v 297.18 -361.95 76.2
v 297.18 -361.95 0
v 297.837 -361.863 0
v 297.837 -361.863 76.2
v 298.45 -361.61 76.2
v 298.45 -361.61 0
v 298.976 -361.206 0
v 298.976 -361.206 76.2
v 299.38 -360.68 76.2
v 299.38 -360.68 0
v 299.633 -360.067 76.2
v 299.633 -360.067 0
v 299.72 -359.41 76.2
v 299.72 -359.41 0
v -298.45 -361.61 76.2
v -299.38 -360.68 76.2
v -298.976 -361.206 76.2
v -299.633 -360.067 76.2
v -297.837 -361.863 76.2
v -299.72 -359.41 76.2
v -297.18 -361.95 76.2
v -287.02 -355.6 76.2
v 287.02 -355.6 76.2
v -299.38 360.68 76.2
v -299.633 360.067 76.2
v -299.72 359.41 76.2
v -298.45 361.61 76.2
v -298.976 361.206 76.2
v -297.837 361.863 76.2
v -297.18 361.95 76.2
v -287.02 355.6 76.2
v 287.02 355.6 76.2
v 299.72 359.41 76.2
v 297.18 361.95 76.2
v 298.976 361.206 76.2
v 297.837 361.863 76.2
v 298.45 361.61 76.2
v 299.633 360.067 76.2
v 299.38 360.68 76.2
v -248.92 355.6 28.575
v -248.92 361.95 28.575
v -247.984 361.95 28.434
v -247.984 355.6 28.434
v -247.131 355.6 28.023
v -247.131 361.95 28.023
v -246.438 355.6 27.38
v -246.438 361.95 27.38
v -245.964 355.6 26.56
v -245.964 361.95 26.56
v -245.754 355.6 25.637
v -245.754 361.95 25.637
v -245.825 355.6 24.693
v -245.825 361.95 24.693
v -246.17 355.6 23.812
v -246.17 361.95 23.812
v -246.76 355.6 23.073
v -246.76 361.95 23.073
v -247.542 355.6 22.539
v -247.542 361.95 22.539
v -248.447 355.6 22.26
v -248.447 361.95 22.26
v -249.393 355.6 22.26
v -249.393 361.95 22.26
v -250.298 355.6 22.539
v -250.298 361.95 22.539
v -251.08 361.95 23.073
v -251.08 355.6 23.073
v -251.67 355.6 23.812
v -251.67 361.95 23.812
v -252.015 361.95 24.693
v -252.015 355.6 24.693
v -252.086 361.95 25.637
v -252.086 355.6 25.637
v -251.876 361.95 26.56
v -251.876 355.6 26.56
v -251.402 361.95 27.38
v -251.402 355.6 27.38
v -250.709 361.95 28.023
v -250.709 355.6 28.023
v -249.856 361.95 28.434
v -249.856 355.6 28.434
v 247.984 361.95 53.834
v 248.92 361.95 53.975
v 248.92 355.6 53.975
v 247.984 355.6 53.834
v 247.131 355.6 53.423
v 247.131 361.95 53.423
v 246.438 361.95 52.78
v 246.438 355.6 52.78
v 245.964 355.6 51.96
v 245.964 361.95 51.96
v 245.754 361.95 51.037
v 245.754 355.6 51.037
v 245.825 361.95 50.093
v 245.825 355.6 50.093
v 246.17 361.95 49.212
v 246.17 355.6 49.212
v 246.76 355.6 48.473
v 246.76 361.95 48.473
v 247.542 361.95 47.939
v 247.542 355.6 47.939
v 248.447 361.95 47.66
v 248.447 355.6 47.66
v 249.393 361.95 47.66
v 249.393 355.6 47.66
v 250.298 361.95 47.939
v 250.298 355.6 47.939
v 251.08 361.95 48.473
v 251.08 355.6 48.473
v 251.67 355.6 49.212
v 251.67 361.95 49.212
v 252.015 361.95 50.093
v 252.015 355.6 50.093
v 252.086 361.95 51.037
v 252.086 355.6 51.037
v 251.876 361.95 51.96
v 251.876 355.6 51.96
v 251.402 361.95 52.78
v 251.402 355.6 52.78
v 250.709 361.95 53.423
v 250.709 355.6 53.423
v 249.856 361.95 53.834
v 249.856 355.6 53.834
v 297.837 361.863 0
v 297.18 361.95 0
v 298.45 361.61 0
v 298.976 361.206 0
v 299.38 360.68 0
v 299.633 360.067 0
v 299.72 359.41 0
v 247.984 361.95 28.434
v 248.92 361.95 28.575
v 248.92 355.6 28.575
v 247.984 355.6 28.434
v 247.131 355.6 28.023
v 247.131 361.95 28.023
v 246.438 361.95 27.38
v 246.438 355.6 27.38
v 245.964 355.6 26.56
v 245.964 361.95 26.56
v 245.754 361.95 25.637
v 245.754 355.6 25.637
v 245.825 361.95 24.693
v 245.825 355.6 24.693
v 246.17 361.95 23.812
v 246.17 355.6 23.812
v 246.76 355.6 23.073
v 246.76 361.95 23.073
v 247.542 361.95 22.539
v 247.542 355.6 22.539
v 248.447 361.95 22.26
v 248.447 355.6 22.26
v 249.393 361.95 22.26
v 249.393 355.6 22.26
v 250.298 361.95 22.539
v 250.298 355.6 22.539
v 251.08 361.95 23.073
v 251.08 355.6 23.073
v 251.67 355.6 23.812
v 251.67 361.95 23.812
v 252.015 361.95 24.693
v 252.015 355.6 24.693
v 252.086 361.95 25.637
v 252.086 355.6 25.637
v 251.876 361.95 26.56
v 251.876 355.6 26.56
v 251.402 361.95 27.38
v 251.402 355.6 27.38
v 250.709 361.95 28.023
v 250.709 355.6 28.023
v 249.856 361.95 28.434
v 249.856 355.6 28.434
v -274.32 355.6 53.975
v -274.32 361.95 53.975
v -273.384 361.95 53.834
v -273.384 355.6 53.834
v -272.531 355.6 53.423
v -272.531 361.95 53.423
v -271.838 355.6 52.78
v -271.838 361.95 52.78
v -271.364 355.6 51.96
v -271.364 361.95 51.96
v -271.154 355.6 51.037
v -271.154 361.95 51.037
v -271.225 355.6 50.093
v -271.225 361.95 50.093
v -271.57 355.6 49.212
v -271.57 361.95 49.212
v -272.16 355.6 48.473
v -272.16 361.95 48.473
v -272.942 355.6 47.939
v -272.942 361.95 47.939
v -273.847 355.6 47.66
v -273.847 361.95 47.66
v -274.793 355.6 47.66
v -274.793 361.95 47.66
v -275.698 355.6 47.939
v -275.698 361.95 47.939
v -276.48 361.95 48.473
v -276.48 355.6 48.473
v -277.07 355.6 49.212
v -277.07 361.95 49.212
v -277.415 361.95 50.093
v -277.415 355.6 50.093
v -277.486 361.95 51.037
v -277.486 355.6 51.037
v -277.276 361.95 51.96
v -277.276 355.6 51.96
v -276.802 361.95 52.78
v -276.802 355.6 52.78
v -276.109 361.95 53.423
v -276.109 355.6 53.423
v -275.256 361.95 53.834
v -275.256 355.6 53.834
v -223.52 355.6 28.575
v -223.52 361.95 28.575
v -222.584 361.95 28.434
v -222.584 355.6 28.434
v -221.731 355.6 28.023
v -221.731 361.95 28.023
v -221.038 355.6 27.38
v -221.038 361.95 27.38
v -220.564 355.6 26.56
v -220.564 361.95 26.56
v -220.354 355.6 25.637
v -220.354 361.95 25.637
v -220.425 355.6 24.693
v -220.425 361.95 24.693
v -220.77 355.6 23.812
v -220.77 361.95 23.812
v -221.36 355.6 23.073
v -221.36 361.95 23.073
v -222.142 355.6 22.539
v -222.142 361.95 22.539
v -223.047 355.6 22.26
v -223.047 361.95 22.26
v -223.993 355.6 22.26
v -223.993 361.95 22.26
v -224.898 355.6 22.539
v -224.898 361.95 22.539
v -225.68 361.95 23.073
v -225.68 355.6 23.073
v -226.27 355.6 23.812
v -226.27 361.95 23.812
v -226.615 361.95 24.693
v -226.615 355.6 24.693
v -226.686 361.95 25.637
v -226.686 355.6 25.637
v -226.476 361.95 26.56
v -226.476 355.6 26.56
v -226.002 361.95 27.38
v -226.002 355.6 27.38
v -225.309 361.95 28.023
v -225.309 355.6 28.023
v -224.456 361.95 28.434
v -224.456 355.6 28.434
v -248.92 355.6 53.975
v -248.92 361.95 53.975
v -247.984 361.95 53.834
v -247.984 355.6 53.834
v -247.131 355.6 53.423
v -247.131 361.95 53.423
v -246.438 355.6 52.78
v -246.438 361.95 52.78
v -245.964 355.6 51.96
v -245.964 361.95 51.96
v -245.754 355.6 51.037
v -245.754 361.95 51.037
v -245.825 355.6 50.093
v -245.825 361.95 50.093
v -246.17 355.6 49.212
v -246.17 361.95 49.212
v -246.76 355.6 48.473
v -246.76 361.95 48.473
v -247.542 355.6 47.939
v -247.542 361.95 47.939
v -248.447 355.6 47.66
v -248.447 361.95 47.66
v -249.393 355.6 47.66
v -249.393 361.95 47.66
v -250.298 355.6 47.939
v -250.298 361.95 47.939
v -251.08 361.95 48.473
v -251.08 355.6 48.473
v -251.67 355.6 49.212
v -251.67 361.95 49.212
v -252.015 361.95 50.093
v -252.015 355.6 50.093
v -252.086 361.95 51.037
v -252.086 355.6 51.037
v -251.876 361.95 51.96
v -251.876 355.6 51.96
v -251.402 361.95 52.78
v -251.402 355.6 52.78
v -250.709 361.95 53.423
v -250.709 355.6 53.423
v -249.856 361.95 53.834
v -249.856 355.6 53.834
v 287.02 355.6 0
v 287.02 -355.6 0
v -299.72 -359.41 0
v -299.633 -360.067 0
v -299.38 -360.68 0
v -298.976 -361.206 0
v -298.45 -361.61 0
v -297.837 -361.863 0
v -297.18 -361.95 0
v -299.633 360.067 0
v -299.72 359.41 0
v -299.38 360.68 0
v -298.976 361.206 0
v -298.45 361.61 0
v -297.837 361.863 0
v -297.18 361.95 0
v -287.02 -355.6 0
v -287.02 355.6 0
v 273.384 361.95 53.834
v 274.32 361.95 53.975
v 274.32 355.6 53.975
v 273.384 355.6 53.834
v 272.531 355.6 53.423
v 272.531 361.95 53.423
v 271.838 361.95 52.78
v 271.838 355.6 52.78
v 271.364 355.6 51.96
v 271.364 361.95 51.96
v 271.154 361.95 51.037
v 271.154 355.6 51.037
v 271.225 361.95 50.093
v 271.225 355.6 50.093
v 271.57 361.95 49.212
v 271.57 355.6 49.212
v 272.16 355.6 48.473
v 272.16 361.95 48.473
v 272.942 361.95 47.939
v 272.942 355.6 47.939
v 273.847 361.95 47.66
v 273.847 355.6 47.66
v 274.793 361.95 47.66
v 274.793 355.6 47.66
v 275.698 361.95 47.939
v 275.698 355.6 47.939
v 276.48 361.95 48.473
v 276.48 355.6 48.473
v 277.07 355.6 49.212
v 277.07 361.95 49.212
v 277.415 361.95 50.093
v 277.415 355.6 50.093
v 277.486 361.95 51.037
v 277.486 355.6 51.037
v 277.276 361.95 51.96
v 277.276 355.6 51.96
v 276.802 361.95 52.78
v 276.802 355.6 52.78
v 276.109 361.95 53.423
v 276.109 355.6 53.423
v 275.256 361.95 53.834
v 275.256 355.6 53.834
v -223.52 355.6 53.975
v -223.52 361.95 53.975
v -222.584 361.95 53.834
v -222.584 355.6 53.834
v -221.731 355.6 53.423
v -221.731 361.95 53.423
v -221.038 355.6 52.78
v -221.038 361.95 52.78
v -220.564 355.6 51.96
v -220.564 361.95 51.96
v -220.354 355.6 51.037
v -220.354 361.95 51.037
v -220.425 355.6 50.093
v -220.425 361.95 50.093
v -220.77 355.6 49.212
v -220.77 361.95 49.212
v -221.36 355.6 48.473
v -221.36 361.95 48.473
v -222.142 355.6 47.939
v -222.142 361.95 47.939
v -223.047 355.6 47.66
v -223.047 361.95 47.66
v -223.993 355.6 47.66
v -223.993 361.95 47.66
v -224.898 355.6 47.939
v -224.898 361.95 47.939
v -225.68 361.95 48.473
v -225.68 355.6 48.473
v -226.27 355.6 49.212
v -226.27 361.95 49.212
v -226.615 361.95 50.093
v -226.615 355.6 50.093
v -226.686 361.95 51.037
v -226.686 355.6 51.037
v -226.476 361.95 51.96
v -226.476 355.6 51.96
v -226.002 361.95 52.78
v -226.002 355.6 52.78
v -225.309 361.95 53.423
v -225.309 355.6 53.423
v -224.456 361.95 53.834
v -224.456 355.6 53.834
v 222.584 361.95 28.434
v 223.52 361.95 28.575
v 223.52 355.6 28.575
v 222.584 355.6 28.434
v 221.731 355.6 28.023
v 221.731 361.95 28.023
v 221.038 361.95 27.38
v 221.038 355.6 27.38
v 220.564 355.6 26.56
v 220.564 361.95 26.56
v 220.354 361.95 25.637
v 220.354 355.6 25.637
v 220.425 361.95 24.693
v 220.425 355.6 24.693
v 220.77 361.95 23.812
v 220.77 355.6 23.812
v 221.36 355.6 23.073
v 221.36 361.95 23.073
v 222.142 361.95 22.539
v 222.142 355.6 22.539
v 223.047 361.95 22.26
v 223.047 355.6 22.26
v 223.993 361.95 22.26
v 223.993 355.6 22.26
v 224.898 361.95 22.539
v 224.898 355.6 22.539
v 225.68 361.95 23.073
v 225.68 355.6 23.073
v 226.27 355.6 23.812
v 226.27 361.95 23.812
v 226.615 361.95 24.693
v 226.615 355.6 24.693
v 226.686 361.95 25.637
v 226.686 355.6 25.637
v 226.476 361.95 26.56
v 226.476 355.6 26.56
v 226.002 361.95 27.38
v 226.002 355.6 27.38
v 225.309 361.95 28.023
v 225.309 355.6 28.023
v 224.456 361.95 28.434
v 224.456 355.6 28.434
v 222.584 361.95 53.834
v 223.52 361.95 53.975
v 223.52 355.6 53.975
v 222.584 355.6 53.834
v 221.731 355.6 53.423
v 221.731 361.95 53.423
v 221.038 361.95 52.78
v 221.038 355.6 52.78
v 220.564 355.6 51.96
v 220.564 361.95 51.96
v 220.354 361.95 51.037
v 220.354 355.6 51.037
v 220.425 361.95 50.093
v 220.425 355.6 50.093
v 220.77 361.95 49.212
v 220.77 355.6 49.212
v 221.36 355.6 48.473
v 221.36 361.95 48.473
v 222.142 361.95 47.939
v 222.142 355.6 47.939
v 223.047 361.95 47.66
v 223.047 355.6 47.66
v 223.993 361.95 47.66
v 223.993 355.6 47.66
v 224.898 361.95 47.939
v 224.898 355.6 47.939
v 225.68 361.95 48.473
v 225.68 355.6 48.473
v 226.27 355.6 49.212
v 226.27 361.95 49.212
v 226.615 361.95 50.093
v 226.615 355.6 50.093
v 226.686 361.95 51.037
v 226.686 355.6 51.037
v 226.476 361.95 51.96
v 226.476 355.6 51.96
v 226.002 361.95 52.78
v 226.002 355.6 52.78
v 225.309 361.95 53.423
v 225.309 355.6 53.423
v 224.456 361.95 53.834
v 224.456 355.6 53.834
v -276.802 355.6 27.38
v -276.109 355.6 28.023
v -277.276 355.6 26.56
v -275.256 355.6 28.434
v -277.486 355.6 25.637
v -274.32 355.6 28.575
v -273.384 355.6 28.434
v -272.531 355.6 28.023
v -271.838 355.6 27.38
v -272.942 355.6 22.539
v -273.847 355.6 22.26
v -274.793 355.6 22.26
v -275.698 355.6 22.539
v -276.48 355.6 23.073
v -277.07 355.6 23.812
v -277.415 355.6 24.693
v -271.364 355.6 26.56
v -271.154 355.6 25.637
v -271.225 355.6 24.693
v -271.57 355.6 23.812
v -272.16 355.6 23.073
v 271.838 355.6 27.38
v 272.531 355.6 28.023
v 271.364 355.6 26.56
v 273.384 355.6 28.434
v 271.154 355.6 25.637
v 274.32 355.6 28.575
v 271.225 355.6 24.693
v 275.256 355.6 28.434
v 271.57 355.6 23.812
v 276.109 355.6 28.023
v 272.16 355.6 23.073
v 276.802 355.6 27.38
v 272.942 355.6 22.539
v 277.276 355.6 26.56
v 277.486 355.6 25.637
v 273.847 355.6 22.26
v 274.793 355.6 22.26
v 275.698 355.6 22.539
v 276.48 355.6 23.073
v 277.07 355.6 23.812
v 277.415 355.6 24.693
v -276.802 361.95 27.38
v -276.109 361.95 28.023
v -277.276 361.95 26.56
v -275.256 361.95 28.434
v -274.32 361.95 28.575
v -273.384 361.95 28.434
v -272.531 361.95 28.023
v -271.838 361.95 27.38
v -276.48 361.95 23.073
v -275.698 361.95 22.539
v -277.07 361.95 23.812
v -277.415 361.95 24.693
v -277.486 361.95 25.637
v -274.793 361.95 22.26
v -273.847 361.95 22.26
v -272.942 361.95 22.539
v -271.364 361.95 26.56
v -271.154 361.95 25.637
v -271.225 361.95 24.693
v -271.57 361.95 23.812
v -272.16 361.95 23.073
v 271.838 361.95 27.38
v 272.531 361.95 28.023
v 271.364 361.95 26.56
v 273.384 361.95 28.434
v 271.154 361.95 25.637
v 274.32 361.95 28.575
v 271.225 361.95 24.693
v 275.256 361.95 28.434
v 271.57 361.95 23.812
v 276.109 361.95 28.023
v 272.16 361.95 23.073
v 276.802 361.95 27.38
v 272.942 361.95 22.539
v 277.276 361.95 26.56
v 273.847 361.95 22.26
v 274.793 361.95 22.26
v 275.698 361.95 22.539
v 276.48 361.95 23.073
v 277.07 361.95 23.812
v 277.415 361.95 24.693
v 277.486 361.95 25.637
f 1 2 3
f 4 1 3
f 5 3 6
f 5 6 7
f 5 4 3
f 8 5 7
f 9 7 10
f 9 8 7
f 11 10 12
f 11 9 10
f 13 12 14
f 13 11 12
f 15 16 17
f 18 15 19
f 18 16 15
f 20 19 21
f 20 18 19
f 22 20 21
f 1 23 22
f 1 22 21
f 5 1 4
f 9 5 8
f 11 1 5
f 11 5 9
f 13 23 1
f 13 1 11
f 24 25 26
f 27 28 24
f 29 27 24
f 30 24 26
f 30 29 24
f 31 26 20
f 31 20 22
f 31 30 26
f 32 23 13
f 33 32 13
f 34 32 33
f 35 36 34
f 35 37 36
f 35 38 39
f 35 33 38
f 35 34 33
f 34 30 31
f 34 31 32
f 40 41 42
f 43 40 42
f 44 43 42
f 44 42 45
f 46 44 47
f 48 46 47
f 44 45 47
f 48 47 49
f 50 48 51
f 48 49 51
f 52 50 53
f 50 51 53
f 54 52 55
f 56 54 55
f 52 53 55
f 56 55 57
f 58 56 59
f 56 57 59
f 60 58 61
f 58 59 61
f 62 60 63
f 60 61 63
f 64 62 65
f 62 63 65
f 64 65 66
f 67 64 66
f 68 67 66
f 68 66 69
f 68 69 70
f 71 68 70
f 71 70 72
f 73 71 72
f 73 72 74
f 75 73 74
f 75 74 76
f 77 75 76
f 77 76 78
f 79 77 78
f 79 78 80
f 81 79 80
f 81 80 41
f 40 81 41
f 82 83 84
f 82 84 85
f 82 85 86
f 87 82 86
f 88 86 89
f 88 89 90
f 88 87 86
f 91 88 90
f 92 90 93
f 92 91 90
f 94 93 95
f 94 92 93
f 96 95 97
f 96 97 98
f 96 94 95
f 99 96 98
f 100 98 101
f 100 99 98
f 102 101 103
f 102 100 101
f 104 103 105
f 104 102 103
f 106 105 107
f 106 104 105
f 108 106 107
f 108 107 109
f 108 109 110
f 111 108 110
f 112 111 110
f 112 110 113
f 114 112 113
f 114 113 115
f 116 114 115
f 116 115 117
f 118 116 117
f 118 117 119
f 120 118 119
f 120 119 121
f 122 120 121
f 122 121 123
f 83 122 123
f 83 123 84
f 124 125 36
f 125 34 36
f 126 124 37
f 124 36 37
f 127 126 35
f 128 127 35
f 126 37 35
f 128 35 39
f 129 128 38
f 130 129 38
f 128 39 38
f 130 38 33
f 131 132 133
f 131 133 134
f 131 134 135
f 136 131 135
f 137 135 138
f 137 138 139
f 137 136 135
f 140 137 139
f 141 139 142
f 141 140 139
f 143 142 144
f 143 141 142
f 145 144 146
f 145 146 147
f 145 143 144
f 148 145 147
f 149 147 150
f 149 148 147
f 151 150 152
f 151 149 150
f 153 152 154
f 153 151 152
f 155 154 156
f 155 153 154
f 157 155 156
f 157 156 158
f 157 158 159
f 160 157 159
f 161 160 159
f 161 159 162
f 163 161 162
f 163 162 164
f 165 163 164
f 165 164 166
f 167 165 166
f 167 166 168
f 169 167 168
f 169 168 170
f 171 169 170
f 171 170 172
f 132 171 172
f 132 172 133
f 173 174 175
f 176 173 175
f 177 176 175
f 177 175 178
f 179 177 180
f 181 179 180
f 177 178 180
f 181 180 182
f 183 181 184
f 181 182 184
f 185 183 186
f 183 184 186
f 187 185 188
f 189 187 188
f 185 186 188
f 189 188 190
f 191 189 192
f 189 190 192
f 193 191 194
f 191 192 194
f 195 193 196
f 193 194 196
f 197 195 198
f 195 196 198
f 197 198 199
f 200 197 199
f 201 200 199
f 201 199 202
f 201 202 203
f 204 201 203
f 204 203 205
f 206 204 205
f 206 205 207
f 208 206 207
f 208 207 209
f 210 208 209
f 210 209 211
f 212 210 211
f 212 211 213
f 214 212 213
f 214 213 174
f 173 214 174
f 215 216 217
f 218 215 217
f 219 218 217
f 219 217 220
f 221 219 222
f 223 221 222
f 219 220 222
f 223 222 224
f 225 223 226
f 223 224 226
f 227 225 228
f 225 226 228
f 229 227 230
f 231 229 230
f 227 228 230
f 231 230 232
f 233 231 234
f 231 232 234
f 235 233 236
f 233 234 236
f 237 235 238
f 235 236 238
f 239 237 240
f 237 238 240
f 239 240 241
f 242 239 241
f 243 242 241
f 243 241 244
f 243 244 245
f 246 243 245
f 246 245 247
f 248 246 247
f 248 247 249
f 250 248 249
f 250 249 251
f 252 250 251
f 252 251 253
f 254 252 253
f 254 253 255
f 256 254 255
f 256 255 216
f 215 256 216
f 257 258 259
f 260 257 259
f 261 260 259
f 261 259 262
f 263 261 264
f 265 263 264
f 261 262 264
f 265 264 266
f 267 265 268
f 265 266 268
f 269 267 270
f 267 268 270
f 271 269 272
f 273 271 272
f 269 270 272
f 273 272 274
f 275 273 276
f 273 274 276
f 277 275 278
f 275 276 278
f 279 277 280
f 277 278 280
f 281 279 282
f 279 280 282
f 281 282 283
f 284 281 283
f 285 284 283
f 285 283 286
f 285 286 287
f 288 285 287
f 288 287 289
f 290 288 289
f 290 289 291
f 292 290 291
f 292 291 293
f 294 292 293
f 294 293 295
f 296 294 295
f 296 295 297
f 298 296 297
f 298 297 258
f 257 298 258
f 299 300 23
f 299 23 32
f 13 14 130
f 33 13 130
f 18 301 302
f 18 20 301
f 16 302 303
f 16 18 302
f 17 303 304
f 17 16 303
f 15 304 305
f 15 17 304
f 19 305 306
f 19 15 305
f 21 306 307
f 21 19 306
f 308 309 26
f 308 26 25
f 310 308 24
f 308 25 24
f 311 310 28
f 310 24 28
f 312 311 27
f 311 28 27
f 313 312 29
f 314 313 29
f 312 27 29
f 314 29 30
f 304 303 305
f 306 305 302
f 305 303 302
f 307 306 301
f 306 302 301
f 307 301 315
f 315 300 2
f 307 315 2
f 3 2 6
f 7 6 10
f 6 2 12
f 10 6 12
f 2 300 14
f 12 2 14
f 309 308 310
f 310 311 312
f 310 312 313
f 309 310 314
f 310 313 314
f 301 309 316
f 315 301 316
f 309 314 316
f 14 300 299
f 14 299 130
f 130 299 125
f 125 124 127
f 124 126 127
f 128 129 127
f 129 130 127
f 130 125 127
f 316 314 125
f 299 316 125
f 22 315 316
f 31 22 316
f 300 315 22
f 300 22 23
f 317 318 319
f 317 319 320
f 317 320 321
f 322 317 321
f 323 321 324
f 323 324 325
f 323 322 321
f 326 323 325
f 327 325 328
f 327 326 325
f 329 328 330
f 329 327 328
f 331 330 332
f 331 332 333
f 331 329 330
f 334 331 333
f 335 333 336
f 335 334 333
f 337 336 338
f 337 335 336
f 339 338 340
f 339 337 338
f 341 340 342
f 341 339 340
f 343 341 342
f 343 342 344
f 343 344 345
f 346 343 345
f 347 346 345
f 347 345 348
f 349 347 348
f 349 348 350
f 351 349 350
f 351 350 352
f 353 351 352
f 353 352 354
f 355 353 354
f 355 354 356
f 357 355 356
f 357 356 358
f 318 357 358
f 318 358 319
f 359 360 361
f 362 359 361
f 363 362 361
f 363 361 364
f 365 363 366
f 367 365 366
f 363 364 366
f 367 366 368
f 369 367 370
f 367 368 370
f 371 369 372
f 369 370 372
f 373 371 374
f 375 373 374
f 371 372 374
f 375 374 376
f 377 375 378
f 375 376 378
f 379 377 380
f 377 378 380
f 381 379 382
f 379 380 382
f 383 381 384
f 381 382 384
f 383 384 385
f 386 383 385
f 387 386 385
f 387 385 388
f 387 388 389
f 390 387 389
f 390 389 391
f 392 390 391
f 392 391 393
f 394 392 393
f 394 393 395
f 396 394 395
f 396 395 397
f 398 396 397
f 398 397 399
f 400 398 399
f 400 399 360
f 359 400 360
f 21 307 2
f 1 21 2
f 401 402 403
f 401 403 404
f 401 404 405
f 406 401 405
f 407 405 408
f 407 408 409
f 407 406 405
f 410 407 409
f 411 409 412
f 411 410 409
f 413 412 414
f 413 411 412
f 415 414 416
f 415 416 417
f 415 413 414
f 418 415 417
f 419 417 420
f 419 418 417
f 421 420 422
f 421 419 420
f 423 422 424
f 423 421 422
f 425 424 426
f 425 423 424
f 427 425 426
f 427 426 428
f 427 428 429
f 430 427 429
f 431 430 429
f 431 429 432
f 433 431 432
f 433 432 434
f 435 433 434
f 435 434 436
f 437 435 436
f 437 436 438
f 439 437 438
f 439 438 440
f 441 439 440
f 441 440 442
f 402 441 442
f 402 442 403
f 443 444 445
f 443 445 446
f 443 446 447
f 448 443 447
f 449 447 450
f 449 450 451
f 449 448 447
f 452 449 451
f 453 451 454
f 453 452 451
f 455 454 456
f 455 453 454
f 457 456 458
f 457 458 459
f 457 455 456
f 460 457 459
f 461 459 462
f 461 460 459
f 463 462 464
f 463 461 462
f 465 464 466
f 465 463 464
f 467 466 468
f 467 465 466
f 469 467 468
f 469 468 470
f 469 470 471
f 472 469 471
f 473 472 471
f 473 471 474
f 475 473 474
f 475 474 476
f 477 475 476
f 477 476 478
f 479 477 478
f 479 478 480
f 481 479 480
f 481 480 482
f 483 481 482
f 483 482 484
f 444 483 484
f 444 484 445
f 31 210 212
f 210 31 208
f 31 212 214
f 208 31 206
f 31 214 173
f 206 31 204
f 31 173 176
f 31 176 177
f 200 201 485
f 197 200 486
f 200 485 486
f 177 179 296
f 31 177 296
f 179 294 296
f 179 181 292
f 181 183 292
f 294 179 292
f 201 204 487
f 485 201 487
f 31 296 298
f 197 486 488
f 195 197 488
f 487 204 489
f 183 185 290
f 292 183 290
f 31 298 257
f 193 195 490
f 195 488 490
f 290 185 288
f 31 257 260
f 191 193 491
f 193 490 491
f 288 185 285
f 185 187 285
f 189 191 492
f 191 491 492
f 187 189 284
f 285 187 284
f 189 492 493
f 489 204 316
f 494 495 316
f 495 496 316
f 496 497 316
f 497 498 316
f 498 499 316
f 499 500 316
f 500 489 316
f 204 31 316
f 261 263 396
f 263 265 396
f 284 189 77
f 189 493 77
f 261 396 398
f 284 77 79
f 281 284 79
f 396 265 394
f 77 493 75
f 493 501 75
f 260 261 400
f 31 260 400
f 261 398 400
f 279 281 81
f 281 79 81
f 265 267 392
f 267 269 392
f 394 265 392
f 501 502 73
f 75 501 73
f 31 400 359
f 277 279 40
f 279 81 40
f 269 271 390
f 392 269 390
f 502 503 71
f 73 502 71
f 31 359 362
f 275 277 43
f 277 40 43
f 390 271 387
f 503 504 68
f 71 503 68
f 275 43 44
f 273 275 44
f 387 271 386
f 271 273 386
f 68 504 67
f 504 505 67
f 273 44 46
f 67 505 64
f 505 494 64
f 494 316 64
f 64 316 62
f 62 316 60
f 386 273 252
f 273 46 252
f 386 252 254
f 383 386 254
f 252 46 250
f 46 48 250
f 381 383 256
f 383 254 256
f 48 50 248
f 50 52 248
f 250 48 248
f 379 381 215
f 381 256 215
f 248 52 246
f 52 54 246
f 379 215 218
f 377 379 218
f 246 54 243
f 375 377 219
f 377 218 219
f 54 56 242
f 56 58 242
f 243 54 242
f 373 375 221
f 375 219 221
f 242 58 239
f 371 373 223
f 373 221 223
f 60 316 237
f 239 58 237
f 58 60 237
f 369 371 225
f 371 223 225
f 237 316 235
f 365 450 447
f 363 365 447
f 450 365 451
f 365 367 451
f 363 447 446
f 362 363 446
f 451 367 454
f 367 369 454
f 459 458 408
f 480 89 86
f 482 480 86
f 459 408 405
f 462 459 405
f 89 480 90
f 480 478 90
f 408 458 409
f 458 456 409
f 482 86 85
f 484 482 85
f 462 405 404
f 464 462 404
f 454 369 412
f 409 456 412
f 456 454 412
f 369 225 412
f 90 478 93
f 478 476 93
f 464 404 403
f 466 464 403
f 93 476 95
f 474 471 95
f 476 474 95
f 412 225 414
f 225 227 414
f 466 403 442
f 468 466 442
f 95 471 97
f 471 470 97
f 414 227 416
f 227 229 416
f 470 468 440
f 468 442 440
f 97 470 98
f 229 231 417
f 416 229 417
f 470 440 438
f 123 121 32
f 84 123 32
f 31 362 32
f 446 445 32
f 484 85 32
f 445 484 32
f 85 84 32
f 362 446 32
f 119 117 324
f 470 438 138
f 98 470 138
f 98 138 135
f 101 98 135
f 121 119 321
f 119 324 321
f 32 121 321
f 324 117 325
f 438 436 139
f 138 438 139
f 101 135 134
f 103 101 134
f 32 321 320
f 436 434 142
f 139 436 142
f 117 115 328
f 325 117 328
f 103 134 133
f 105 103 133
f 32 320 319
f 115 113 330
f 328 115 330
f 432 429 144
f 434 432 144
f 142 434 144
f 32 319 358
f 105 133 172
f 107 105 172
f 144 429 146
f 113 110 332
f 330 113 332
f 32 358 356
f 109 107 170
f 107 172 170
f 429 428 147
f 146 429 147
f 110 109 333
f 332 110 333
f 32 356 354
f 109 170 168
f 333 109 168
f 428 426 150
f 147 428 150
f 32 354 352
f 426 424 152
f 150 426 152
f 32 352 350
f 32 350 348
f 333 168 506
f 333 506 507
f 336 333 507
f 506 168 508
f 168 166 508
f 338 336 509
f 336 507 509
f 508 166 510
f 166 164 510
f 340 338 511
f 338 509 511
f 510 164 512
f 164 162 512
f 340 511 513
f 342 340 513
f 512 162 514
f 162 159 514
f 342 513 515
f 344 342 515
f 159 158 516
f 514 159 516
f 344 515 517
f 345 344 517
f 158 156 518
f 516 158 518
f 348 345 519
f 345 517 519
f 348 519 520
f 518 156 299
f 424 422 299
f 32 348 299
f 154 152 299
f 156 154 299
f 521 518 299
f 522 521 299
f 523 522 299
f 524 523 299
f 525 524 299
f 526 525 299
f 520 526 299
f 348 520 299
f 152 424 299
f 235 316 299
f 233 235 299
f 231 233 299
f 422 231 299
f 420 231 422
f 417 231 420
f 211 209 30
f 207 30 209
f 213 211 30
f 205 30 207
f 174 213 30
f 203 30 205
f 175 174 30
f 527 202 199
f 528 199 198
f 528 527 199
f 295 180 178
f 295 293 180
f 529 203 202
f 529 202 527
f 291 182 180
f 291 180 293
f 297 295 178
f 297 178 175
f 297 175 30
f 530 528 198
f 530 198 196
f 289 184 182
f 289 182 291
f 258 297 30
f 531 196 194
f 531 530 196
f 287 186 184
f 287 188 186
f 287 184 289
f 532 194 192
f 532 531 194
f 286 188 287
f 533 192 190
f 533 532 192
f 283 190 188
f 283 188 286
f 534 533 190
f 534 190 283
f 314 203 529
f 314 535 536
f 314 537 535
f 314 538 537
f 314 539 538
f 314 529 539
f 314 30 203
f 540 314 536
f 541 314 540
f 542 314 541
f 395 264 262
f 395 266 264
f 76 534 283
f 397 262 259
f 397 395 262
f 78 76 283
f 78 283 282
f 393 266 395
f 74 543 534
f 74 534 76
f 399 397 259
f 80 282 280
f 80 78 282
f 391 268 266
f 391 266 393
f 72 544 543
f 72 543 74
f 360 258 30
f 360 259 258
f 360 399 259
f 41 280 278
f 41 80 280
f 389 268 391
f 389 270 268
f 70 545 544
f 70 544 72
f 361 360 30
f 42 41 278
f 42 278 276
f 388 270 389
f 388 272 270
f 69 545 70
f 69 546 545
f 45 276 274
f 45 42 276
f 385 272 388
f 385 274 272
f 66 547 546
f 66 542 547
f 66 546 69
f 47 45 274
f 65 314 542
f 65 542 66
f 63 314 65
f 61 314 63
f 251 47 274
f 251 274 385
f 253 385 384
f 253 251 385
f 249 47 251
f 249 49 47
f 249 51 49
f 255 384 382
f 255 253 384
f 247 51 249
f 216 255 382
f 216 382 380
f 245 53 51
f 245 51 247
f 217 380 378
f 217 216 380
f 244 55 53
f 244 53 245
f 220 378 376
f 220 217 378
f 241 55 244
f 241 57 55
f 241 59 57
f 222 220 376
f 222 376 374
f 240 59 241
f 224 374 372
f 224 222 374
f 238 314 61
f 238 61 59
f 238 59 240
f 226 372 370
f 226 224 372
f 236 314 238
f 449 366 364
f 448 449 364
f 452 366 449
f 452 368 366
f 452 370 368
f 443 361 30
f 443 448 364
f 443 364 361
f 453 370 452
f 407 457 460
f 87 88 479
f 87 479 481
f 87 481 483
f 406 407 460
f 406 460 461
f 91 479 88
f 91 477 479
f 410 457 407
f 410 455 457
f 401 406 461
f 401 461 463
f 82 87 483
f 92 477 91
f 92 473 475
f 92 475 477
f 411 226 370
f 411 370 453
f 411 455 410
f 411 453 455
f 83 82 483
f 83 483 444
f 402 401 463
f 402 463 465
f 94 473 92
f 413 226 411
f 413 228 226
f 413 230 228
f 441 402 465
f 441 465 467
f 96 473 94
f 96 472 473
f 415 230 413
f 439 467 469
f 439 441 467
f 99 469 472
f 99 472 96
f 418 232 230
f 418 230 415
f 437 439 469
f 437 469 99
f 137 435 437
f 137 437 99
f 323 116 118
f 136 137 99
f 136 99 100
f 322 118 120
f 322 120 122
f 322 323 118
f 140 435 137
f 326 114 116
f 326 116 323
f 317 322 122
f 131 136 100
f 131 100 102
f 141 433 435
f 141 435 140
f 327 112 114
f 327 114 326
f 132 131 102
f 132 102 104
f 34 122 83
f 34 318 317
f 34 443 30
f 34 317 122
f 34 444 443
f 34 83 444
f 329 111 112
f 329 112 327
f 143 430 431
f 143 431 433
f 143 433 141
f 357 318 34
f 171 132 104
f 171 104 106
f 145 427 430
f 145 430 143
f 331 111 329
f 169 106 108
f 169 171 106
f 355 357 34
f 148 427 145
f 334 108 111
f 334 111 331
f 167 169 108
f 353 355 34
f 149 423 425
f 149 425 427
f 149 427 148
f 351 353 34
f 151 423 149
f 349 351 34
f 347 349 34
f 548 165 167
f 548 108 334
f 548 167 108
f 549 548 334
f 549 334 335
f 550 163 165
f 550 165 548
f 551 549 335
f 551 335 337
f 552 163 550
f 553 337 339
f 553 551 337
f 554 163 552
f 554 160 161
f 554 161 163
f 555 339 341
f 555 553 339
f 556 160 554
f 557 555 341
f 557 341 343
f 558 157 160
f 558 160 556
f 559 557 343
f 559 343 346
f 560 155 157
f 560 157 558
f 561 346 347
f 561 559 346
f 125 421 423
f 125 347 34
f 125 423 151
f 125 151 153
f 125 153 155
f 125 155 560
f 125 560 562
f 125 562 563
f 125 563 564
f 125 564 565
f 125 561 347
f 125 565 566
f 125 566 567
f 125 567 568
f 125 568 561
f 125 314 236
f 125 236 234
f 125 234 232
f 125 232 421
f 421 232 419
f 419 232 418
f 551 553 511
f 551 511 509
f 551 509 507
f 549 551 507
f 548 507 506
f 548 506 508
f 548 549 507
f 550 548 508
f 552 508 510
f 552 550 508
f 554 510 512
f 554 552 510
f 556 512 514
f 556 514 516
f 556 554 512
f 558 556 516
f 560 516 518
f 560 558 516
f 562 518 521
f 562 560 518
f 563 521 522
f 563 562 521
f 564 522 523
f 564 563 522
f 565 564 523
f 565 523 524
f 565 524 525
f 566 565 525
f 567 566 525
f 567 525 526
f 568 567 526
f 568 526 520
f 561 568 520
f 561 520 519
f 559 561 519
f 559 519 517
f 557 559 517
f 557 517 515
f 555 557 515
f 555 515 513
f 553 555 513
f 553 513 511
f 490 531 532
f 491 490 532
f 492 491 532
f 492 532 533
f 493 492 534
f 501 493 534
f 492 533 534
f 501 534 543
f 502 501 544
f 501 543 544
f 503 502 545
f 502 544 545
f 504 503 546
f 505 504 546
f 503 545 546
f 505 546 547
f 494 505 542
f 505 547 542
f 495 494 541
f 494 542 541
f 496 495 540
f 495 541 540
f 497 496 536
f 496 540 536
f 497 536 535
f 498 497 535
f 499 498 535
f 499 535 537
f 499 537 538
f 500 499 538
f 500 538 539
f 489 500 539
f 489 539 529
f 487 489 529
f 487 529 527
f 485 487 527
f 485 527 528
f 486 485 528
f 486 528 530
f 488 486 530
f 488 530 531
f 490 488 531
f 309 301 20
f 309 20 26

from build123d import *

# Parameters (mm, degrees)
SKETCH1_W           = 599.44
SKETCH1_H           = 723.9
SKETCH1_W_2         = 574.04
SKETCH1_H_2         = 711.2
BOSS_EXTRUDE1_DEPTH = 76.2
CUT_EXTRUDE1_REACH  = 789.191
SKETCH2_R           = 3.175
FILLET1_R           = 2.54


with BuildPart() as part:
    # Sketch1 → Boss-Extrude1 (new body)
    with BuildSketch(Plane.XY):
        Rectangle(SKETCH1_W, SKETCH1_H)
        Rectangle(SKETCH1_W_2, SKETCH1_H_2, mode=Mode.SUBTRACT)
    extrude(amount=BOSS_EXTRUDE1_DEPTH)

    # Sketch2 → Cut-Extrude1 (cut, up to next)
    with BuildSketch(Plane(origin=(0, 361.95, 0), x_dir=(1, 0, 0), z_dir=(0, 1, 0)), mode=Mode.PRIVATE) as cut_extrude1_sk1:
        with Locations(Location((-274.32, -50.8, 0), (0, 0, 270))):
            Circle(SKETCH2_R)
    cut_extrude1_tool1 = extrude(cut_extrude1_sk1.sketch, amount=-CUT_EXTRUDE1_REACH, mode=Mode.PRIVATE) & part.part
    # Sketch2 → Cut-Extrude1 (cut, up to next)
    with BuildSketch(Plane(origin=(0, 361.95, 0), x_dir=(1, 0, 0), z_dir=(0, 1, 0)), mode=Mode.PRIVATE) as cut_extrude1_sk2:
        with Locations(Location((-274.32, -25.4, 0), (0, 0, 270))):
            Circle(SKETCH2_R)
    cut_extrude1_tool2 = extrude(cut_extrude1_sk2.sketch, amount=-CUT_EXTRUDE1_REACH, mode=Mode.PRIVATE) & part.part
    # Sketch2 → Cut-Extrude1 (cut, up to next)
    with BuildSketch(Plane(origin=(0, 361.95, 0), x_dir=(1, 0, 0), z_dir=(0, 1, 0)), mode=Mode.PRIVATE) as cut_extrude1_sk3:
        with Locations(Location((-248.92, -50.8, 0), (0, 0, 270))):
            Circle(SKETCH2_R)
    cut_extrude1_tool3 = extrude(cut_extrude1_sk3.sketch, amount=-CUT_EXTRUDE1_REACH, mode=Mode.PRIVATE) & part.part
    # Sketch2 → Cut-Extrude1 (cut, up to next)
    with BuildSketch(Plane(origin=(0, 361.95, 0), x_dir=(1, 0, 0), z_dir=(0, 1, 0)), mode=Mode.PRIVATE) as cut_extrude1_sk4:
        with Locations(Location((-248.92, -25.4, 0), (0, 0, 270))):
            Circle(SKETCH2_R)
    cut_extrude1_tool4 = extrude(cut_extrude1_sk4.sketch, amount=-CUT_EXTRUDE1_REACH, mode=Mode.PRIVATE) & part.part
    # Sketch2 → Cut-Extrude1 (cut, up to next)
    with BuildSketch(Plane(origin=(0, 361.95, 0), x_dir=(1, 0, 0), z_dir=(0, 1, 0)), mode=Mode.PRIVATE) as cut_extrude1_sk5:
        with Locations(Location((-223.52, -50.8, 0), (0, 0, 270))):
            Circle(SKETCH2_R)
    cut_extrude1_tool5 = extrude(cut_extrude1_sk5.sketch, amount=-CUT_EXTRUDE1_REACH, mode=Mode.PRIVATE) & part.part
    # Sketch2 → Cut-Extrude1 (cut, up to next)
    with BuildSketch(Plane(origin=(0, 361.95, 0), x_dir=(1, 0, 0), z_dir=(0, 1, 0)), mode=Mode.PRIVATE) as cut_extrude1_sk6:
        with Locations(Location((-223.52, -25.4, 0), (0, 0, 270))):
            Circle(SKETCH2_R)
    cut_extrude1_tool6 = extrude(cut_extrude1_sk6.sketch, amount=-CUT_EXTRUDE1_REACH, mode=Mode.PRIVATE) & part.part
    cut_extrude1_1 = cut_extrude1_tool1.solids().sort_by_distance((-274.32, 361.95, 50.8))[0]
    add(cut_extrude1_1, mode=Mode.SUBTRACT)
    cut_extrude1_2 = cut_extrude1_tool2.solids().sort_by_distance((-274.32, 361.95, 25.4))[0]
    add(cut_extrude1_2, mode=Mode.SUBTRACT)
    cut_extrude1_3 = cut_extrude1_tool3.solids().sort_by_distance((-248.92, 361.95, 50.8))[0]
    add(cut_extrude1_3, mode=Mode.SUBTRACT)
    cut_extrude1_4 = cut_extrude1_tool4.solids().sort_by_distance((-248.92, 361.95, 25.4))[0]
    add(cut_extrude1_4, mode=Mode.SUBTRACT)
    cut_extrude1_5 = cut_extrude1_tool5.solids().sort_by_distance((-223.52, 361.95, 50.8))[0]
    add(cut_extrude1_5, mode=Mode.SUBTRACT)
    cut_extrude1_6 = cut_extrude1_tool6.solids().sort_by_distance((-223.52, 361.95, 25.4))[0]
    add(cut_extrude1_6, mode=Mode.SUBTRACT)
    cut_extrude1 = cut_extrude1_1 + cut_extrude1_2 + cut_extrude1_3 + cut_extrude1_4 + cut_extrude1_5 + cut_extrude1_6  # Cut-Extrude1 as one shape, for the pattern or mirror that repeats it

    # Mirror1: Cut-Extrude1 across plane
    add(cut_extrude1.mirror(Plane(origin=(0, 0, 0), x_dir=(0, 0, 1), z_dir=(1, 0, 0))), mode=Mode.SUBTRACT)

    # Fillet1
    fillet1_edges = [part.edges().sort_by_distance(p)[0] for p in [
        (-299.72, -361.95, 38.1),
        (-299.72, 361.95, 38.1),
        (299.72, 361.95, 38.1),
        (299.72, -361.95, 38.1),
    ]]
    fillet(fillet1_edges, radius=FILLET1_R)


solid = part.part
